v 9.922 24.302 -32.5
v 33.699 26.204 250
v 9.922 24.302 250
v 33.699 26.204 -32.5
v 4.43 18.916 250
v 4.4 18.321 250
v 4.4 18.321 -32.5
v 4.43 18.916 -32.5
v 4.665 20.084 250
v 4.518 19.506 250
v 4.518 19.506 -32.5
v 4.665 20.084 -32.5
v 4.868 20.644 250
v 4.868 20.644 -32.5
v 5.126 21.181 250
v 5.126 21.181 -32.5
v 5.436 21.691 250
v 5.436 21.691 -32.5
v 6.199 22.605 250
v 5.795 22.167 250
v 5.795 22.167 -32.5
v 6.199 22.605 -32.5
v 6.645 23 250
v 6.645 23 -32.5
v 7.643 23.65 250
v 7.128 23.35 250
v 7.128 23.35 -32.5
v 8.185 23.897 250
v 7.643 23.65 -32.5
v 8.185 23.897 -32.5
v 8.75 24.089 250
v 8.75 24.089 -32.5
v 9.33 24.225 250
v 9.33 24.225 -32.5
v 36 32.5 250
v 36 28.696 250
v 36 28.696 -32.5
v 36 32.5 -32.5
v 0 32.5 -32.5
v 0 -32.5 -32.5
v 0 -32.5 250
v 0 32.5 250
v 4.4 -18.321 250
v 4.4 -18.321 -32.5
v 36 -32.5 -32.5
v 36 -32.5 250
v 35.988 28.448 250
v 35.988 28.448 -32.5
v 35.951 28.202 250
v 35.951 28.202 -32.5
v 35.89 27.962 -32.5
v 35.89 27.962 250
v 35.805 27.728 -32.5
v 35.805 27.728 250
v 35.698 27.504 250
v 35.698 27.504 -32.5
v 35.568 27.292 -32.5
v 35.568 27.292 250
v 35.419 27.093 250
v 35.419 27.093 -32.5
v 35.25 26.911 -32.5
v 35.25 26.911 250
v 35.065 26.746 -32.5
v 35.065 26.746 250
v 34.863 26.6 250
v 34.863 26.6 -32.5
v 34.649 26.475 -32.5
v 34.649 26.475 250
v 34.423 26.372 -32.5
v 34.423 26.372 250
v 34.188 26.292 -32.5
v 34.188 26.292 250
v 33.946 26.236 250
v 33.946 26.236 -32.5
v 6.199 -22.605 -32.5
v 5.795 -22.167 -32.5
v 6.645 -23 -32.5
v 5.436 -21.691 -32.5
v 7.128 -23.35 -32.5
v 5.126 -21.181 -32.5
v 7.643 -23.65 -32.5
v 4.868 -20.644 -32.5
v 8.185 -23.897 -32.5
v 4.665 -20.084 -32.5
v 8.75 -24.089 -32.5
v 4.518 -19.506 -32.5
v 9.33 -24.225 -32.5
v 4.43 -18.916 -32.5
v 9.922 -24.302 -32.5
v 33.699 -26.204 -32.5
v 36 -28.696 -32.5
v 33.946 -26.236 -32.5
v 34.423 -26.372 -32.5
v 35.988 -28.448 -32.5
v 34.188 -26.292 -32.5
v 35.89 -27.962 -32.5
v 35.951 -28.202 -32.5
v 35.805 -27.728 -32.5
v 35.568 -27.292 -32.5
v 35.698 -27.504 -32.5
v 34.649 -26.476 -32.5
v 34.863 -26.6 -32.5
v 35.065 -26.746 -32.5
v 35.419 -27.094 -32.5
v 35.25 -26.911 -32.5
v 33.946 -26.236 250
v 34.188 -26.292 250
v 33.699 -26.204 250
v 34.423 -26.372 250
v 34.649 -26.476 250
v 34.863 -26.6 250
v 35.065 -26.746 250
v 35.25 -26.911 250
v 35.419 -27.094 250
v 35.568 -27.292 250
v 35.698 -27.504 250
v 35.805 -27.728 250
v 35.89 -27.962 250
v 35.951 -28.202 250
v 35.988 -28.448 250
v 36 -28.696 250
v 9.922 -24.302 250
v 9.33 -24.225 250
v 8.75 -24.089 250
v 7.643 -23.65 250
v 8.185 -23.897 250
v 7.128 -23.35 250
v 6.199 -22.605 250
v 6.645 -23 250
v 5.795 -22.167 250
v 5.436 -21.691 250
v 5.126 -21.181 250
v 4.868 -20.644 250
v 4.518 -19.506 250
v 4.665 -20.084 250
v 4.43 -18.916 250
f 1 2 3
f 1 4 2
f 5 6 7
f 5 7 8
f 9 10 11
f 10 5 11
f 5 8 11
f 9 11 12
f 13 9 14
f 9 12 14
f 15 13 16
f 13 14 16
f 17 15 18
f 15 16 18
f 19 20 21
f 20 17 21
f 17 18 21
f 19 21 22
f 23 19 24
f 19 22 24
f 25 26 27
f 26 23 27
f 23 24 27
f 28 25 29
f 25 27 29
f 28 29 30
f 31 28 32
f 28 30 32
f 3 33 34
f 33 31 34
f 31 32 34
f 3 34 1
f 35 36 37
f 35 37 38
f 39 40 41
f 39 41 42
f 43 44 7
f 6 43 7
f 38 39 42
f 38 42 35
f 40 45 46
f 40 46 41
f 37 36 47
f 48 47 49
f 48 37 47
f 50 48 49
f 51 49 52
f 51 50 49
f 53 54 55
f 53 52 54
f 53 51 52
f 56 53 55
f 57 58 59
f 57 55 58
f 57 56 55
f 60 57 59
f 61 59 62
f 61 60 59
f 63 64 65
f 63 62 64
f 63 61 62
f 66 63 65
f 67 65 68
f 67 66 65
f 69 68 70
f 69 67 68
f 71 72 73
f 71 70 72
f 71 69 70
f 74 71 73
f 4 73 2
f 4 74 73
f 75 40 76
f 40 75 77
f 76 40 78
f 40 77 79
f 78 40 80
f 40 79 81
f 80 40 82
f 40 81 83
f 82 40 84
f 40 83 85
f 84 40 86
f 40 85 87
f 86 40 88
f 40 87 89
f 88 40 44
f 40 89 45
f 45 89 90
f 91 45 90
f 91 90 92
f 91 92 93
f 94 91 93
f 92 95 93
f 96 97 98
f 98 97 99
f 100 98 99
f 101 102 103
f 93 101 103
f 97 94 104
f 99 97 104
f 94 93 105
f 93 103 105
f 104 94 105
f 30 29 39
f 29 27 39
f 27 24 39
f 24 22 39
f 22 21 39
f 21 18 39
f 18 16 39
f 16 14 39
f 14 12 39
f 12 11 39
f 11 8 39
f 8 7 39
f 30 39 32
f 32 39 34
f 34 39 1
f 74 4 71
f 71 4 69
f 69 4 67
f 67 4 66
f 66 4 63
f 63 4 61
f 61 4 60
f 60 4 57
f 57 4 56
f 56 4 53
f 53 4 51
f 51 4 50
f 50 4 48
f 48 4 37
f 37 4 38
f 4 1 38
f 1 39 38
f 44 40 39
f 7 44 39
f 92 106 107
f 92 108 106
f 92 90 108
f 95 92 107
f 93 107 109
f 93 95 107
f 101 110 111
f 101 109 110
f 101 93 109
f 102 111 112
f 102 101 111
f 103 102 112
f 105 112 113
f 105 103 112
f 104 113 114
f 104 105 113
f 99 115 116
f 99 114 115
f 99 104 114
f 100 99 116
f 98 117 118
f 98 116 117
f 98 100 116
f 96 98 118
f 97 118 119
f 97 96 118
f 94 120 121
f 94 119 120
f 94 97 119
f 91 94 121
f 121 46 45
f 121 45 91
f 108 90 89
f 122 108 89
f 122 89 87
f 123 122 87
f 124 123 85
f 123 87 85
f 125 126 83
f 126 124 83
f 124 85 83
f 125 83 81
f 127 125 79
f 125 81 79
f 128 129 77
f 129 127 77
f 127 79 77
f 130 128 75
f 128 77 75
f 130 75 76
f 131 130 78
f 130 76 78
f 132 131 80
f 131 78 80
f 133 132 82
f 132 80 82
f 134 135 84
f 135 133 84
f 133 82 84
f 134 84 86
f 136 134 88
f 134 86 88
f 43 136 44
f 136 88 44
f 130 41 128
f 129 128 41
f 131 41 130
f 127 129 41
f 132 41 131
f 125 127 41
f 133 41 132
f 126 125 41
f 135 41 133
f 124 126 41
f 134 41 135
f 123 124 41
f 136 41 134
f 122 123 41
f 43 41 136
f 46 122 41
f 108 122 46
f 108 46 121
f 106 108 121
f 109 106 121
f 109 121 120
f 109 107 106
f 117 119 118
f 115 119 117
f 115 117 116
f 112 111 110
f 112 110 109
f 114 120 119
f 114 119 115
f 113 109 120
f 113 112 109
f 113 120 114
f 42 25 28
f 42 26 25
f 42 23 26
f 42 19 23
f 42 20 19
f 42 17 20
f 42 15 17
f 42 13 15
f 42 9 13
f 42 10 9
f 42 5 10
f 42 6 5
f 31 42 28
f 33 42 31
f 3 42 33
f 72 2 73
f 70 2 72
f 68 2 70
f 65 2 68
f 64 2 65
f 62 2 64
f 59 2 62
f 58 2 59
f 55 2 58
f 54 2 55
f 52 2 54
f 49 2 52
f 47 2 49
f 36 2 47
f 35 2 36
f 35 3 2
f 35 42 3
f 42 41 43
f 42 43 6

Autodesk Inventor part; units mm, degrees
ref_plane "Начальная плоскость" through (0, 0, -32.5) normal (0, 0, 1) x (1, 0, 0)
ref_plane "Конечная плоскость" through (0, 0, 250) normal (0, 0, 1) x (1, 0, 0)
sketch "Эскиз" plane through (0, 0, 0) normal (0, 0, 1) x (1, 0, 0)
  line L0 (36, -32.5) -> (0, -32.5)
  line L1 (36, -32.5) -> (36, -28.696)
  line L2 (33.6994, -26.2039) -> (9.9215, -24.3017)
  line L3 (4.4, -18.3208) -> (4.4, 18.3208)
  line L4 (33.6994, 26.2039) -> (9.9215, 24.3017)
  line L5 (36, 28.696) -> (36, 32.5)
  line L6 (0, 32.5) -> (36, 32.5)
  line L7 (0, -32.5) -> (0, 32.5)
  arc A0 (4.4, -18.3208) -> (9.9215, -24.3017) centre (10.4, -18.3208) ccw
  arc A1 (9.9215, 24.3017) -> (4.4, 18.3208) centre (10.4, 18.3208) ccw
  arc A2 (36, -28.696) -> (33.6994, -26.2039) centre (33.5, -28.696) ccw
  arc A3 (33.6994, 26.2039) -> (36, 28.696) centre (33.5, 28.696) ccw
  line L8 (0, 45.5) -> (0, -45.5) construction
  line L9 (-7.2974, 0) -> (43.7847, 0) construction
  point P0 (36, -26.388)
  point P1 (4.4, -23.86)
  point P2 (4.4, 23.86)
  point P3 (36, 26.388)
  dimension "d3" = 36
  dimension "d5" = 4.4
  dimension "d7" = 65
  dimension "d9" = 8.64
  dimension "d11" = 8.64
  dimension "d13" = 6.112
  dimension "d15" = 6.112
  dimension "d22" = 6
  dimension "d23" = 2.5
  dimension "d24" = 32.5
  dimension "d25" = 0
extrude "Тело" add sketch "Эскиз" along normal up to surface (282.5 mm away) from surface at -32.5
sketch "Sketch3" plane through (0, 0, 0) normal (0, 0, 1) x (1, 0, 0)
  line L0 (0, 0) -> (10, 0)
ref_plane "Work Plane7" through (0, 0, 0) normal (0, -1, 0) x (1, 0, 0)
sketch "Sketch4" plane through (0, 0, 0) normal (0, -1, 0) x (1, 0, 0)
  line L0 (-2, -32.5) -> (12, -32.5)
  line L1 (-2, 250) -> (12, 250)
  dimension "d29" = 282.5
ref_plane "РабПлоскость8" through (18, -177.5, -32.5) normal (0, 0, -1) x (-1, 0, 0)
split "Разделение1" plane through (18, -177.5, -32.5) removes the side toward (0, 0, -1)
equation "\"d3\" = b"
equation "\"d5\" = t1"
equation "\"d7\" = ParH"
equation "\"d9\" = msp_x1 + t2"
equation "\"d11\" = msp_x1 + t2"
equation "\"d13\" = -msp_x2 + t2"
equation "\"d15\" = -msp_x2 + t2"
equation "\"d22\" = R"
equation "\"d23\" = R1"
equation "\"d24\" = 0.5 * d7"
equation "\"d16\" = G_L"
equation "\"R1\" = 2.5"
equation "\"R\" = 6"
equation "\"t1\" = 4.4"
equation "\"t2\" = 7.2"
equation "\"ParH\" = 65"
equation "\"b\" = 36"
equation "\"msp_x1\" = 0.04 * b"
equation "\"msp_x2\" = -0.08 * t1 + 0.04 * b"
equation "\"G_L\" = d29"
equation "\"ex\" = 0"
equation "\"G_OFFSET_START\" = 32.5"
equation "\"G_OFFSET_END\" = 0"
equation "\"d26\" = -G_OFFSET_START"
properties part number "Швеллер 6.5U-282,5 ГОСТ 8240-97"
